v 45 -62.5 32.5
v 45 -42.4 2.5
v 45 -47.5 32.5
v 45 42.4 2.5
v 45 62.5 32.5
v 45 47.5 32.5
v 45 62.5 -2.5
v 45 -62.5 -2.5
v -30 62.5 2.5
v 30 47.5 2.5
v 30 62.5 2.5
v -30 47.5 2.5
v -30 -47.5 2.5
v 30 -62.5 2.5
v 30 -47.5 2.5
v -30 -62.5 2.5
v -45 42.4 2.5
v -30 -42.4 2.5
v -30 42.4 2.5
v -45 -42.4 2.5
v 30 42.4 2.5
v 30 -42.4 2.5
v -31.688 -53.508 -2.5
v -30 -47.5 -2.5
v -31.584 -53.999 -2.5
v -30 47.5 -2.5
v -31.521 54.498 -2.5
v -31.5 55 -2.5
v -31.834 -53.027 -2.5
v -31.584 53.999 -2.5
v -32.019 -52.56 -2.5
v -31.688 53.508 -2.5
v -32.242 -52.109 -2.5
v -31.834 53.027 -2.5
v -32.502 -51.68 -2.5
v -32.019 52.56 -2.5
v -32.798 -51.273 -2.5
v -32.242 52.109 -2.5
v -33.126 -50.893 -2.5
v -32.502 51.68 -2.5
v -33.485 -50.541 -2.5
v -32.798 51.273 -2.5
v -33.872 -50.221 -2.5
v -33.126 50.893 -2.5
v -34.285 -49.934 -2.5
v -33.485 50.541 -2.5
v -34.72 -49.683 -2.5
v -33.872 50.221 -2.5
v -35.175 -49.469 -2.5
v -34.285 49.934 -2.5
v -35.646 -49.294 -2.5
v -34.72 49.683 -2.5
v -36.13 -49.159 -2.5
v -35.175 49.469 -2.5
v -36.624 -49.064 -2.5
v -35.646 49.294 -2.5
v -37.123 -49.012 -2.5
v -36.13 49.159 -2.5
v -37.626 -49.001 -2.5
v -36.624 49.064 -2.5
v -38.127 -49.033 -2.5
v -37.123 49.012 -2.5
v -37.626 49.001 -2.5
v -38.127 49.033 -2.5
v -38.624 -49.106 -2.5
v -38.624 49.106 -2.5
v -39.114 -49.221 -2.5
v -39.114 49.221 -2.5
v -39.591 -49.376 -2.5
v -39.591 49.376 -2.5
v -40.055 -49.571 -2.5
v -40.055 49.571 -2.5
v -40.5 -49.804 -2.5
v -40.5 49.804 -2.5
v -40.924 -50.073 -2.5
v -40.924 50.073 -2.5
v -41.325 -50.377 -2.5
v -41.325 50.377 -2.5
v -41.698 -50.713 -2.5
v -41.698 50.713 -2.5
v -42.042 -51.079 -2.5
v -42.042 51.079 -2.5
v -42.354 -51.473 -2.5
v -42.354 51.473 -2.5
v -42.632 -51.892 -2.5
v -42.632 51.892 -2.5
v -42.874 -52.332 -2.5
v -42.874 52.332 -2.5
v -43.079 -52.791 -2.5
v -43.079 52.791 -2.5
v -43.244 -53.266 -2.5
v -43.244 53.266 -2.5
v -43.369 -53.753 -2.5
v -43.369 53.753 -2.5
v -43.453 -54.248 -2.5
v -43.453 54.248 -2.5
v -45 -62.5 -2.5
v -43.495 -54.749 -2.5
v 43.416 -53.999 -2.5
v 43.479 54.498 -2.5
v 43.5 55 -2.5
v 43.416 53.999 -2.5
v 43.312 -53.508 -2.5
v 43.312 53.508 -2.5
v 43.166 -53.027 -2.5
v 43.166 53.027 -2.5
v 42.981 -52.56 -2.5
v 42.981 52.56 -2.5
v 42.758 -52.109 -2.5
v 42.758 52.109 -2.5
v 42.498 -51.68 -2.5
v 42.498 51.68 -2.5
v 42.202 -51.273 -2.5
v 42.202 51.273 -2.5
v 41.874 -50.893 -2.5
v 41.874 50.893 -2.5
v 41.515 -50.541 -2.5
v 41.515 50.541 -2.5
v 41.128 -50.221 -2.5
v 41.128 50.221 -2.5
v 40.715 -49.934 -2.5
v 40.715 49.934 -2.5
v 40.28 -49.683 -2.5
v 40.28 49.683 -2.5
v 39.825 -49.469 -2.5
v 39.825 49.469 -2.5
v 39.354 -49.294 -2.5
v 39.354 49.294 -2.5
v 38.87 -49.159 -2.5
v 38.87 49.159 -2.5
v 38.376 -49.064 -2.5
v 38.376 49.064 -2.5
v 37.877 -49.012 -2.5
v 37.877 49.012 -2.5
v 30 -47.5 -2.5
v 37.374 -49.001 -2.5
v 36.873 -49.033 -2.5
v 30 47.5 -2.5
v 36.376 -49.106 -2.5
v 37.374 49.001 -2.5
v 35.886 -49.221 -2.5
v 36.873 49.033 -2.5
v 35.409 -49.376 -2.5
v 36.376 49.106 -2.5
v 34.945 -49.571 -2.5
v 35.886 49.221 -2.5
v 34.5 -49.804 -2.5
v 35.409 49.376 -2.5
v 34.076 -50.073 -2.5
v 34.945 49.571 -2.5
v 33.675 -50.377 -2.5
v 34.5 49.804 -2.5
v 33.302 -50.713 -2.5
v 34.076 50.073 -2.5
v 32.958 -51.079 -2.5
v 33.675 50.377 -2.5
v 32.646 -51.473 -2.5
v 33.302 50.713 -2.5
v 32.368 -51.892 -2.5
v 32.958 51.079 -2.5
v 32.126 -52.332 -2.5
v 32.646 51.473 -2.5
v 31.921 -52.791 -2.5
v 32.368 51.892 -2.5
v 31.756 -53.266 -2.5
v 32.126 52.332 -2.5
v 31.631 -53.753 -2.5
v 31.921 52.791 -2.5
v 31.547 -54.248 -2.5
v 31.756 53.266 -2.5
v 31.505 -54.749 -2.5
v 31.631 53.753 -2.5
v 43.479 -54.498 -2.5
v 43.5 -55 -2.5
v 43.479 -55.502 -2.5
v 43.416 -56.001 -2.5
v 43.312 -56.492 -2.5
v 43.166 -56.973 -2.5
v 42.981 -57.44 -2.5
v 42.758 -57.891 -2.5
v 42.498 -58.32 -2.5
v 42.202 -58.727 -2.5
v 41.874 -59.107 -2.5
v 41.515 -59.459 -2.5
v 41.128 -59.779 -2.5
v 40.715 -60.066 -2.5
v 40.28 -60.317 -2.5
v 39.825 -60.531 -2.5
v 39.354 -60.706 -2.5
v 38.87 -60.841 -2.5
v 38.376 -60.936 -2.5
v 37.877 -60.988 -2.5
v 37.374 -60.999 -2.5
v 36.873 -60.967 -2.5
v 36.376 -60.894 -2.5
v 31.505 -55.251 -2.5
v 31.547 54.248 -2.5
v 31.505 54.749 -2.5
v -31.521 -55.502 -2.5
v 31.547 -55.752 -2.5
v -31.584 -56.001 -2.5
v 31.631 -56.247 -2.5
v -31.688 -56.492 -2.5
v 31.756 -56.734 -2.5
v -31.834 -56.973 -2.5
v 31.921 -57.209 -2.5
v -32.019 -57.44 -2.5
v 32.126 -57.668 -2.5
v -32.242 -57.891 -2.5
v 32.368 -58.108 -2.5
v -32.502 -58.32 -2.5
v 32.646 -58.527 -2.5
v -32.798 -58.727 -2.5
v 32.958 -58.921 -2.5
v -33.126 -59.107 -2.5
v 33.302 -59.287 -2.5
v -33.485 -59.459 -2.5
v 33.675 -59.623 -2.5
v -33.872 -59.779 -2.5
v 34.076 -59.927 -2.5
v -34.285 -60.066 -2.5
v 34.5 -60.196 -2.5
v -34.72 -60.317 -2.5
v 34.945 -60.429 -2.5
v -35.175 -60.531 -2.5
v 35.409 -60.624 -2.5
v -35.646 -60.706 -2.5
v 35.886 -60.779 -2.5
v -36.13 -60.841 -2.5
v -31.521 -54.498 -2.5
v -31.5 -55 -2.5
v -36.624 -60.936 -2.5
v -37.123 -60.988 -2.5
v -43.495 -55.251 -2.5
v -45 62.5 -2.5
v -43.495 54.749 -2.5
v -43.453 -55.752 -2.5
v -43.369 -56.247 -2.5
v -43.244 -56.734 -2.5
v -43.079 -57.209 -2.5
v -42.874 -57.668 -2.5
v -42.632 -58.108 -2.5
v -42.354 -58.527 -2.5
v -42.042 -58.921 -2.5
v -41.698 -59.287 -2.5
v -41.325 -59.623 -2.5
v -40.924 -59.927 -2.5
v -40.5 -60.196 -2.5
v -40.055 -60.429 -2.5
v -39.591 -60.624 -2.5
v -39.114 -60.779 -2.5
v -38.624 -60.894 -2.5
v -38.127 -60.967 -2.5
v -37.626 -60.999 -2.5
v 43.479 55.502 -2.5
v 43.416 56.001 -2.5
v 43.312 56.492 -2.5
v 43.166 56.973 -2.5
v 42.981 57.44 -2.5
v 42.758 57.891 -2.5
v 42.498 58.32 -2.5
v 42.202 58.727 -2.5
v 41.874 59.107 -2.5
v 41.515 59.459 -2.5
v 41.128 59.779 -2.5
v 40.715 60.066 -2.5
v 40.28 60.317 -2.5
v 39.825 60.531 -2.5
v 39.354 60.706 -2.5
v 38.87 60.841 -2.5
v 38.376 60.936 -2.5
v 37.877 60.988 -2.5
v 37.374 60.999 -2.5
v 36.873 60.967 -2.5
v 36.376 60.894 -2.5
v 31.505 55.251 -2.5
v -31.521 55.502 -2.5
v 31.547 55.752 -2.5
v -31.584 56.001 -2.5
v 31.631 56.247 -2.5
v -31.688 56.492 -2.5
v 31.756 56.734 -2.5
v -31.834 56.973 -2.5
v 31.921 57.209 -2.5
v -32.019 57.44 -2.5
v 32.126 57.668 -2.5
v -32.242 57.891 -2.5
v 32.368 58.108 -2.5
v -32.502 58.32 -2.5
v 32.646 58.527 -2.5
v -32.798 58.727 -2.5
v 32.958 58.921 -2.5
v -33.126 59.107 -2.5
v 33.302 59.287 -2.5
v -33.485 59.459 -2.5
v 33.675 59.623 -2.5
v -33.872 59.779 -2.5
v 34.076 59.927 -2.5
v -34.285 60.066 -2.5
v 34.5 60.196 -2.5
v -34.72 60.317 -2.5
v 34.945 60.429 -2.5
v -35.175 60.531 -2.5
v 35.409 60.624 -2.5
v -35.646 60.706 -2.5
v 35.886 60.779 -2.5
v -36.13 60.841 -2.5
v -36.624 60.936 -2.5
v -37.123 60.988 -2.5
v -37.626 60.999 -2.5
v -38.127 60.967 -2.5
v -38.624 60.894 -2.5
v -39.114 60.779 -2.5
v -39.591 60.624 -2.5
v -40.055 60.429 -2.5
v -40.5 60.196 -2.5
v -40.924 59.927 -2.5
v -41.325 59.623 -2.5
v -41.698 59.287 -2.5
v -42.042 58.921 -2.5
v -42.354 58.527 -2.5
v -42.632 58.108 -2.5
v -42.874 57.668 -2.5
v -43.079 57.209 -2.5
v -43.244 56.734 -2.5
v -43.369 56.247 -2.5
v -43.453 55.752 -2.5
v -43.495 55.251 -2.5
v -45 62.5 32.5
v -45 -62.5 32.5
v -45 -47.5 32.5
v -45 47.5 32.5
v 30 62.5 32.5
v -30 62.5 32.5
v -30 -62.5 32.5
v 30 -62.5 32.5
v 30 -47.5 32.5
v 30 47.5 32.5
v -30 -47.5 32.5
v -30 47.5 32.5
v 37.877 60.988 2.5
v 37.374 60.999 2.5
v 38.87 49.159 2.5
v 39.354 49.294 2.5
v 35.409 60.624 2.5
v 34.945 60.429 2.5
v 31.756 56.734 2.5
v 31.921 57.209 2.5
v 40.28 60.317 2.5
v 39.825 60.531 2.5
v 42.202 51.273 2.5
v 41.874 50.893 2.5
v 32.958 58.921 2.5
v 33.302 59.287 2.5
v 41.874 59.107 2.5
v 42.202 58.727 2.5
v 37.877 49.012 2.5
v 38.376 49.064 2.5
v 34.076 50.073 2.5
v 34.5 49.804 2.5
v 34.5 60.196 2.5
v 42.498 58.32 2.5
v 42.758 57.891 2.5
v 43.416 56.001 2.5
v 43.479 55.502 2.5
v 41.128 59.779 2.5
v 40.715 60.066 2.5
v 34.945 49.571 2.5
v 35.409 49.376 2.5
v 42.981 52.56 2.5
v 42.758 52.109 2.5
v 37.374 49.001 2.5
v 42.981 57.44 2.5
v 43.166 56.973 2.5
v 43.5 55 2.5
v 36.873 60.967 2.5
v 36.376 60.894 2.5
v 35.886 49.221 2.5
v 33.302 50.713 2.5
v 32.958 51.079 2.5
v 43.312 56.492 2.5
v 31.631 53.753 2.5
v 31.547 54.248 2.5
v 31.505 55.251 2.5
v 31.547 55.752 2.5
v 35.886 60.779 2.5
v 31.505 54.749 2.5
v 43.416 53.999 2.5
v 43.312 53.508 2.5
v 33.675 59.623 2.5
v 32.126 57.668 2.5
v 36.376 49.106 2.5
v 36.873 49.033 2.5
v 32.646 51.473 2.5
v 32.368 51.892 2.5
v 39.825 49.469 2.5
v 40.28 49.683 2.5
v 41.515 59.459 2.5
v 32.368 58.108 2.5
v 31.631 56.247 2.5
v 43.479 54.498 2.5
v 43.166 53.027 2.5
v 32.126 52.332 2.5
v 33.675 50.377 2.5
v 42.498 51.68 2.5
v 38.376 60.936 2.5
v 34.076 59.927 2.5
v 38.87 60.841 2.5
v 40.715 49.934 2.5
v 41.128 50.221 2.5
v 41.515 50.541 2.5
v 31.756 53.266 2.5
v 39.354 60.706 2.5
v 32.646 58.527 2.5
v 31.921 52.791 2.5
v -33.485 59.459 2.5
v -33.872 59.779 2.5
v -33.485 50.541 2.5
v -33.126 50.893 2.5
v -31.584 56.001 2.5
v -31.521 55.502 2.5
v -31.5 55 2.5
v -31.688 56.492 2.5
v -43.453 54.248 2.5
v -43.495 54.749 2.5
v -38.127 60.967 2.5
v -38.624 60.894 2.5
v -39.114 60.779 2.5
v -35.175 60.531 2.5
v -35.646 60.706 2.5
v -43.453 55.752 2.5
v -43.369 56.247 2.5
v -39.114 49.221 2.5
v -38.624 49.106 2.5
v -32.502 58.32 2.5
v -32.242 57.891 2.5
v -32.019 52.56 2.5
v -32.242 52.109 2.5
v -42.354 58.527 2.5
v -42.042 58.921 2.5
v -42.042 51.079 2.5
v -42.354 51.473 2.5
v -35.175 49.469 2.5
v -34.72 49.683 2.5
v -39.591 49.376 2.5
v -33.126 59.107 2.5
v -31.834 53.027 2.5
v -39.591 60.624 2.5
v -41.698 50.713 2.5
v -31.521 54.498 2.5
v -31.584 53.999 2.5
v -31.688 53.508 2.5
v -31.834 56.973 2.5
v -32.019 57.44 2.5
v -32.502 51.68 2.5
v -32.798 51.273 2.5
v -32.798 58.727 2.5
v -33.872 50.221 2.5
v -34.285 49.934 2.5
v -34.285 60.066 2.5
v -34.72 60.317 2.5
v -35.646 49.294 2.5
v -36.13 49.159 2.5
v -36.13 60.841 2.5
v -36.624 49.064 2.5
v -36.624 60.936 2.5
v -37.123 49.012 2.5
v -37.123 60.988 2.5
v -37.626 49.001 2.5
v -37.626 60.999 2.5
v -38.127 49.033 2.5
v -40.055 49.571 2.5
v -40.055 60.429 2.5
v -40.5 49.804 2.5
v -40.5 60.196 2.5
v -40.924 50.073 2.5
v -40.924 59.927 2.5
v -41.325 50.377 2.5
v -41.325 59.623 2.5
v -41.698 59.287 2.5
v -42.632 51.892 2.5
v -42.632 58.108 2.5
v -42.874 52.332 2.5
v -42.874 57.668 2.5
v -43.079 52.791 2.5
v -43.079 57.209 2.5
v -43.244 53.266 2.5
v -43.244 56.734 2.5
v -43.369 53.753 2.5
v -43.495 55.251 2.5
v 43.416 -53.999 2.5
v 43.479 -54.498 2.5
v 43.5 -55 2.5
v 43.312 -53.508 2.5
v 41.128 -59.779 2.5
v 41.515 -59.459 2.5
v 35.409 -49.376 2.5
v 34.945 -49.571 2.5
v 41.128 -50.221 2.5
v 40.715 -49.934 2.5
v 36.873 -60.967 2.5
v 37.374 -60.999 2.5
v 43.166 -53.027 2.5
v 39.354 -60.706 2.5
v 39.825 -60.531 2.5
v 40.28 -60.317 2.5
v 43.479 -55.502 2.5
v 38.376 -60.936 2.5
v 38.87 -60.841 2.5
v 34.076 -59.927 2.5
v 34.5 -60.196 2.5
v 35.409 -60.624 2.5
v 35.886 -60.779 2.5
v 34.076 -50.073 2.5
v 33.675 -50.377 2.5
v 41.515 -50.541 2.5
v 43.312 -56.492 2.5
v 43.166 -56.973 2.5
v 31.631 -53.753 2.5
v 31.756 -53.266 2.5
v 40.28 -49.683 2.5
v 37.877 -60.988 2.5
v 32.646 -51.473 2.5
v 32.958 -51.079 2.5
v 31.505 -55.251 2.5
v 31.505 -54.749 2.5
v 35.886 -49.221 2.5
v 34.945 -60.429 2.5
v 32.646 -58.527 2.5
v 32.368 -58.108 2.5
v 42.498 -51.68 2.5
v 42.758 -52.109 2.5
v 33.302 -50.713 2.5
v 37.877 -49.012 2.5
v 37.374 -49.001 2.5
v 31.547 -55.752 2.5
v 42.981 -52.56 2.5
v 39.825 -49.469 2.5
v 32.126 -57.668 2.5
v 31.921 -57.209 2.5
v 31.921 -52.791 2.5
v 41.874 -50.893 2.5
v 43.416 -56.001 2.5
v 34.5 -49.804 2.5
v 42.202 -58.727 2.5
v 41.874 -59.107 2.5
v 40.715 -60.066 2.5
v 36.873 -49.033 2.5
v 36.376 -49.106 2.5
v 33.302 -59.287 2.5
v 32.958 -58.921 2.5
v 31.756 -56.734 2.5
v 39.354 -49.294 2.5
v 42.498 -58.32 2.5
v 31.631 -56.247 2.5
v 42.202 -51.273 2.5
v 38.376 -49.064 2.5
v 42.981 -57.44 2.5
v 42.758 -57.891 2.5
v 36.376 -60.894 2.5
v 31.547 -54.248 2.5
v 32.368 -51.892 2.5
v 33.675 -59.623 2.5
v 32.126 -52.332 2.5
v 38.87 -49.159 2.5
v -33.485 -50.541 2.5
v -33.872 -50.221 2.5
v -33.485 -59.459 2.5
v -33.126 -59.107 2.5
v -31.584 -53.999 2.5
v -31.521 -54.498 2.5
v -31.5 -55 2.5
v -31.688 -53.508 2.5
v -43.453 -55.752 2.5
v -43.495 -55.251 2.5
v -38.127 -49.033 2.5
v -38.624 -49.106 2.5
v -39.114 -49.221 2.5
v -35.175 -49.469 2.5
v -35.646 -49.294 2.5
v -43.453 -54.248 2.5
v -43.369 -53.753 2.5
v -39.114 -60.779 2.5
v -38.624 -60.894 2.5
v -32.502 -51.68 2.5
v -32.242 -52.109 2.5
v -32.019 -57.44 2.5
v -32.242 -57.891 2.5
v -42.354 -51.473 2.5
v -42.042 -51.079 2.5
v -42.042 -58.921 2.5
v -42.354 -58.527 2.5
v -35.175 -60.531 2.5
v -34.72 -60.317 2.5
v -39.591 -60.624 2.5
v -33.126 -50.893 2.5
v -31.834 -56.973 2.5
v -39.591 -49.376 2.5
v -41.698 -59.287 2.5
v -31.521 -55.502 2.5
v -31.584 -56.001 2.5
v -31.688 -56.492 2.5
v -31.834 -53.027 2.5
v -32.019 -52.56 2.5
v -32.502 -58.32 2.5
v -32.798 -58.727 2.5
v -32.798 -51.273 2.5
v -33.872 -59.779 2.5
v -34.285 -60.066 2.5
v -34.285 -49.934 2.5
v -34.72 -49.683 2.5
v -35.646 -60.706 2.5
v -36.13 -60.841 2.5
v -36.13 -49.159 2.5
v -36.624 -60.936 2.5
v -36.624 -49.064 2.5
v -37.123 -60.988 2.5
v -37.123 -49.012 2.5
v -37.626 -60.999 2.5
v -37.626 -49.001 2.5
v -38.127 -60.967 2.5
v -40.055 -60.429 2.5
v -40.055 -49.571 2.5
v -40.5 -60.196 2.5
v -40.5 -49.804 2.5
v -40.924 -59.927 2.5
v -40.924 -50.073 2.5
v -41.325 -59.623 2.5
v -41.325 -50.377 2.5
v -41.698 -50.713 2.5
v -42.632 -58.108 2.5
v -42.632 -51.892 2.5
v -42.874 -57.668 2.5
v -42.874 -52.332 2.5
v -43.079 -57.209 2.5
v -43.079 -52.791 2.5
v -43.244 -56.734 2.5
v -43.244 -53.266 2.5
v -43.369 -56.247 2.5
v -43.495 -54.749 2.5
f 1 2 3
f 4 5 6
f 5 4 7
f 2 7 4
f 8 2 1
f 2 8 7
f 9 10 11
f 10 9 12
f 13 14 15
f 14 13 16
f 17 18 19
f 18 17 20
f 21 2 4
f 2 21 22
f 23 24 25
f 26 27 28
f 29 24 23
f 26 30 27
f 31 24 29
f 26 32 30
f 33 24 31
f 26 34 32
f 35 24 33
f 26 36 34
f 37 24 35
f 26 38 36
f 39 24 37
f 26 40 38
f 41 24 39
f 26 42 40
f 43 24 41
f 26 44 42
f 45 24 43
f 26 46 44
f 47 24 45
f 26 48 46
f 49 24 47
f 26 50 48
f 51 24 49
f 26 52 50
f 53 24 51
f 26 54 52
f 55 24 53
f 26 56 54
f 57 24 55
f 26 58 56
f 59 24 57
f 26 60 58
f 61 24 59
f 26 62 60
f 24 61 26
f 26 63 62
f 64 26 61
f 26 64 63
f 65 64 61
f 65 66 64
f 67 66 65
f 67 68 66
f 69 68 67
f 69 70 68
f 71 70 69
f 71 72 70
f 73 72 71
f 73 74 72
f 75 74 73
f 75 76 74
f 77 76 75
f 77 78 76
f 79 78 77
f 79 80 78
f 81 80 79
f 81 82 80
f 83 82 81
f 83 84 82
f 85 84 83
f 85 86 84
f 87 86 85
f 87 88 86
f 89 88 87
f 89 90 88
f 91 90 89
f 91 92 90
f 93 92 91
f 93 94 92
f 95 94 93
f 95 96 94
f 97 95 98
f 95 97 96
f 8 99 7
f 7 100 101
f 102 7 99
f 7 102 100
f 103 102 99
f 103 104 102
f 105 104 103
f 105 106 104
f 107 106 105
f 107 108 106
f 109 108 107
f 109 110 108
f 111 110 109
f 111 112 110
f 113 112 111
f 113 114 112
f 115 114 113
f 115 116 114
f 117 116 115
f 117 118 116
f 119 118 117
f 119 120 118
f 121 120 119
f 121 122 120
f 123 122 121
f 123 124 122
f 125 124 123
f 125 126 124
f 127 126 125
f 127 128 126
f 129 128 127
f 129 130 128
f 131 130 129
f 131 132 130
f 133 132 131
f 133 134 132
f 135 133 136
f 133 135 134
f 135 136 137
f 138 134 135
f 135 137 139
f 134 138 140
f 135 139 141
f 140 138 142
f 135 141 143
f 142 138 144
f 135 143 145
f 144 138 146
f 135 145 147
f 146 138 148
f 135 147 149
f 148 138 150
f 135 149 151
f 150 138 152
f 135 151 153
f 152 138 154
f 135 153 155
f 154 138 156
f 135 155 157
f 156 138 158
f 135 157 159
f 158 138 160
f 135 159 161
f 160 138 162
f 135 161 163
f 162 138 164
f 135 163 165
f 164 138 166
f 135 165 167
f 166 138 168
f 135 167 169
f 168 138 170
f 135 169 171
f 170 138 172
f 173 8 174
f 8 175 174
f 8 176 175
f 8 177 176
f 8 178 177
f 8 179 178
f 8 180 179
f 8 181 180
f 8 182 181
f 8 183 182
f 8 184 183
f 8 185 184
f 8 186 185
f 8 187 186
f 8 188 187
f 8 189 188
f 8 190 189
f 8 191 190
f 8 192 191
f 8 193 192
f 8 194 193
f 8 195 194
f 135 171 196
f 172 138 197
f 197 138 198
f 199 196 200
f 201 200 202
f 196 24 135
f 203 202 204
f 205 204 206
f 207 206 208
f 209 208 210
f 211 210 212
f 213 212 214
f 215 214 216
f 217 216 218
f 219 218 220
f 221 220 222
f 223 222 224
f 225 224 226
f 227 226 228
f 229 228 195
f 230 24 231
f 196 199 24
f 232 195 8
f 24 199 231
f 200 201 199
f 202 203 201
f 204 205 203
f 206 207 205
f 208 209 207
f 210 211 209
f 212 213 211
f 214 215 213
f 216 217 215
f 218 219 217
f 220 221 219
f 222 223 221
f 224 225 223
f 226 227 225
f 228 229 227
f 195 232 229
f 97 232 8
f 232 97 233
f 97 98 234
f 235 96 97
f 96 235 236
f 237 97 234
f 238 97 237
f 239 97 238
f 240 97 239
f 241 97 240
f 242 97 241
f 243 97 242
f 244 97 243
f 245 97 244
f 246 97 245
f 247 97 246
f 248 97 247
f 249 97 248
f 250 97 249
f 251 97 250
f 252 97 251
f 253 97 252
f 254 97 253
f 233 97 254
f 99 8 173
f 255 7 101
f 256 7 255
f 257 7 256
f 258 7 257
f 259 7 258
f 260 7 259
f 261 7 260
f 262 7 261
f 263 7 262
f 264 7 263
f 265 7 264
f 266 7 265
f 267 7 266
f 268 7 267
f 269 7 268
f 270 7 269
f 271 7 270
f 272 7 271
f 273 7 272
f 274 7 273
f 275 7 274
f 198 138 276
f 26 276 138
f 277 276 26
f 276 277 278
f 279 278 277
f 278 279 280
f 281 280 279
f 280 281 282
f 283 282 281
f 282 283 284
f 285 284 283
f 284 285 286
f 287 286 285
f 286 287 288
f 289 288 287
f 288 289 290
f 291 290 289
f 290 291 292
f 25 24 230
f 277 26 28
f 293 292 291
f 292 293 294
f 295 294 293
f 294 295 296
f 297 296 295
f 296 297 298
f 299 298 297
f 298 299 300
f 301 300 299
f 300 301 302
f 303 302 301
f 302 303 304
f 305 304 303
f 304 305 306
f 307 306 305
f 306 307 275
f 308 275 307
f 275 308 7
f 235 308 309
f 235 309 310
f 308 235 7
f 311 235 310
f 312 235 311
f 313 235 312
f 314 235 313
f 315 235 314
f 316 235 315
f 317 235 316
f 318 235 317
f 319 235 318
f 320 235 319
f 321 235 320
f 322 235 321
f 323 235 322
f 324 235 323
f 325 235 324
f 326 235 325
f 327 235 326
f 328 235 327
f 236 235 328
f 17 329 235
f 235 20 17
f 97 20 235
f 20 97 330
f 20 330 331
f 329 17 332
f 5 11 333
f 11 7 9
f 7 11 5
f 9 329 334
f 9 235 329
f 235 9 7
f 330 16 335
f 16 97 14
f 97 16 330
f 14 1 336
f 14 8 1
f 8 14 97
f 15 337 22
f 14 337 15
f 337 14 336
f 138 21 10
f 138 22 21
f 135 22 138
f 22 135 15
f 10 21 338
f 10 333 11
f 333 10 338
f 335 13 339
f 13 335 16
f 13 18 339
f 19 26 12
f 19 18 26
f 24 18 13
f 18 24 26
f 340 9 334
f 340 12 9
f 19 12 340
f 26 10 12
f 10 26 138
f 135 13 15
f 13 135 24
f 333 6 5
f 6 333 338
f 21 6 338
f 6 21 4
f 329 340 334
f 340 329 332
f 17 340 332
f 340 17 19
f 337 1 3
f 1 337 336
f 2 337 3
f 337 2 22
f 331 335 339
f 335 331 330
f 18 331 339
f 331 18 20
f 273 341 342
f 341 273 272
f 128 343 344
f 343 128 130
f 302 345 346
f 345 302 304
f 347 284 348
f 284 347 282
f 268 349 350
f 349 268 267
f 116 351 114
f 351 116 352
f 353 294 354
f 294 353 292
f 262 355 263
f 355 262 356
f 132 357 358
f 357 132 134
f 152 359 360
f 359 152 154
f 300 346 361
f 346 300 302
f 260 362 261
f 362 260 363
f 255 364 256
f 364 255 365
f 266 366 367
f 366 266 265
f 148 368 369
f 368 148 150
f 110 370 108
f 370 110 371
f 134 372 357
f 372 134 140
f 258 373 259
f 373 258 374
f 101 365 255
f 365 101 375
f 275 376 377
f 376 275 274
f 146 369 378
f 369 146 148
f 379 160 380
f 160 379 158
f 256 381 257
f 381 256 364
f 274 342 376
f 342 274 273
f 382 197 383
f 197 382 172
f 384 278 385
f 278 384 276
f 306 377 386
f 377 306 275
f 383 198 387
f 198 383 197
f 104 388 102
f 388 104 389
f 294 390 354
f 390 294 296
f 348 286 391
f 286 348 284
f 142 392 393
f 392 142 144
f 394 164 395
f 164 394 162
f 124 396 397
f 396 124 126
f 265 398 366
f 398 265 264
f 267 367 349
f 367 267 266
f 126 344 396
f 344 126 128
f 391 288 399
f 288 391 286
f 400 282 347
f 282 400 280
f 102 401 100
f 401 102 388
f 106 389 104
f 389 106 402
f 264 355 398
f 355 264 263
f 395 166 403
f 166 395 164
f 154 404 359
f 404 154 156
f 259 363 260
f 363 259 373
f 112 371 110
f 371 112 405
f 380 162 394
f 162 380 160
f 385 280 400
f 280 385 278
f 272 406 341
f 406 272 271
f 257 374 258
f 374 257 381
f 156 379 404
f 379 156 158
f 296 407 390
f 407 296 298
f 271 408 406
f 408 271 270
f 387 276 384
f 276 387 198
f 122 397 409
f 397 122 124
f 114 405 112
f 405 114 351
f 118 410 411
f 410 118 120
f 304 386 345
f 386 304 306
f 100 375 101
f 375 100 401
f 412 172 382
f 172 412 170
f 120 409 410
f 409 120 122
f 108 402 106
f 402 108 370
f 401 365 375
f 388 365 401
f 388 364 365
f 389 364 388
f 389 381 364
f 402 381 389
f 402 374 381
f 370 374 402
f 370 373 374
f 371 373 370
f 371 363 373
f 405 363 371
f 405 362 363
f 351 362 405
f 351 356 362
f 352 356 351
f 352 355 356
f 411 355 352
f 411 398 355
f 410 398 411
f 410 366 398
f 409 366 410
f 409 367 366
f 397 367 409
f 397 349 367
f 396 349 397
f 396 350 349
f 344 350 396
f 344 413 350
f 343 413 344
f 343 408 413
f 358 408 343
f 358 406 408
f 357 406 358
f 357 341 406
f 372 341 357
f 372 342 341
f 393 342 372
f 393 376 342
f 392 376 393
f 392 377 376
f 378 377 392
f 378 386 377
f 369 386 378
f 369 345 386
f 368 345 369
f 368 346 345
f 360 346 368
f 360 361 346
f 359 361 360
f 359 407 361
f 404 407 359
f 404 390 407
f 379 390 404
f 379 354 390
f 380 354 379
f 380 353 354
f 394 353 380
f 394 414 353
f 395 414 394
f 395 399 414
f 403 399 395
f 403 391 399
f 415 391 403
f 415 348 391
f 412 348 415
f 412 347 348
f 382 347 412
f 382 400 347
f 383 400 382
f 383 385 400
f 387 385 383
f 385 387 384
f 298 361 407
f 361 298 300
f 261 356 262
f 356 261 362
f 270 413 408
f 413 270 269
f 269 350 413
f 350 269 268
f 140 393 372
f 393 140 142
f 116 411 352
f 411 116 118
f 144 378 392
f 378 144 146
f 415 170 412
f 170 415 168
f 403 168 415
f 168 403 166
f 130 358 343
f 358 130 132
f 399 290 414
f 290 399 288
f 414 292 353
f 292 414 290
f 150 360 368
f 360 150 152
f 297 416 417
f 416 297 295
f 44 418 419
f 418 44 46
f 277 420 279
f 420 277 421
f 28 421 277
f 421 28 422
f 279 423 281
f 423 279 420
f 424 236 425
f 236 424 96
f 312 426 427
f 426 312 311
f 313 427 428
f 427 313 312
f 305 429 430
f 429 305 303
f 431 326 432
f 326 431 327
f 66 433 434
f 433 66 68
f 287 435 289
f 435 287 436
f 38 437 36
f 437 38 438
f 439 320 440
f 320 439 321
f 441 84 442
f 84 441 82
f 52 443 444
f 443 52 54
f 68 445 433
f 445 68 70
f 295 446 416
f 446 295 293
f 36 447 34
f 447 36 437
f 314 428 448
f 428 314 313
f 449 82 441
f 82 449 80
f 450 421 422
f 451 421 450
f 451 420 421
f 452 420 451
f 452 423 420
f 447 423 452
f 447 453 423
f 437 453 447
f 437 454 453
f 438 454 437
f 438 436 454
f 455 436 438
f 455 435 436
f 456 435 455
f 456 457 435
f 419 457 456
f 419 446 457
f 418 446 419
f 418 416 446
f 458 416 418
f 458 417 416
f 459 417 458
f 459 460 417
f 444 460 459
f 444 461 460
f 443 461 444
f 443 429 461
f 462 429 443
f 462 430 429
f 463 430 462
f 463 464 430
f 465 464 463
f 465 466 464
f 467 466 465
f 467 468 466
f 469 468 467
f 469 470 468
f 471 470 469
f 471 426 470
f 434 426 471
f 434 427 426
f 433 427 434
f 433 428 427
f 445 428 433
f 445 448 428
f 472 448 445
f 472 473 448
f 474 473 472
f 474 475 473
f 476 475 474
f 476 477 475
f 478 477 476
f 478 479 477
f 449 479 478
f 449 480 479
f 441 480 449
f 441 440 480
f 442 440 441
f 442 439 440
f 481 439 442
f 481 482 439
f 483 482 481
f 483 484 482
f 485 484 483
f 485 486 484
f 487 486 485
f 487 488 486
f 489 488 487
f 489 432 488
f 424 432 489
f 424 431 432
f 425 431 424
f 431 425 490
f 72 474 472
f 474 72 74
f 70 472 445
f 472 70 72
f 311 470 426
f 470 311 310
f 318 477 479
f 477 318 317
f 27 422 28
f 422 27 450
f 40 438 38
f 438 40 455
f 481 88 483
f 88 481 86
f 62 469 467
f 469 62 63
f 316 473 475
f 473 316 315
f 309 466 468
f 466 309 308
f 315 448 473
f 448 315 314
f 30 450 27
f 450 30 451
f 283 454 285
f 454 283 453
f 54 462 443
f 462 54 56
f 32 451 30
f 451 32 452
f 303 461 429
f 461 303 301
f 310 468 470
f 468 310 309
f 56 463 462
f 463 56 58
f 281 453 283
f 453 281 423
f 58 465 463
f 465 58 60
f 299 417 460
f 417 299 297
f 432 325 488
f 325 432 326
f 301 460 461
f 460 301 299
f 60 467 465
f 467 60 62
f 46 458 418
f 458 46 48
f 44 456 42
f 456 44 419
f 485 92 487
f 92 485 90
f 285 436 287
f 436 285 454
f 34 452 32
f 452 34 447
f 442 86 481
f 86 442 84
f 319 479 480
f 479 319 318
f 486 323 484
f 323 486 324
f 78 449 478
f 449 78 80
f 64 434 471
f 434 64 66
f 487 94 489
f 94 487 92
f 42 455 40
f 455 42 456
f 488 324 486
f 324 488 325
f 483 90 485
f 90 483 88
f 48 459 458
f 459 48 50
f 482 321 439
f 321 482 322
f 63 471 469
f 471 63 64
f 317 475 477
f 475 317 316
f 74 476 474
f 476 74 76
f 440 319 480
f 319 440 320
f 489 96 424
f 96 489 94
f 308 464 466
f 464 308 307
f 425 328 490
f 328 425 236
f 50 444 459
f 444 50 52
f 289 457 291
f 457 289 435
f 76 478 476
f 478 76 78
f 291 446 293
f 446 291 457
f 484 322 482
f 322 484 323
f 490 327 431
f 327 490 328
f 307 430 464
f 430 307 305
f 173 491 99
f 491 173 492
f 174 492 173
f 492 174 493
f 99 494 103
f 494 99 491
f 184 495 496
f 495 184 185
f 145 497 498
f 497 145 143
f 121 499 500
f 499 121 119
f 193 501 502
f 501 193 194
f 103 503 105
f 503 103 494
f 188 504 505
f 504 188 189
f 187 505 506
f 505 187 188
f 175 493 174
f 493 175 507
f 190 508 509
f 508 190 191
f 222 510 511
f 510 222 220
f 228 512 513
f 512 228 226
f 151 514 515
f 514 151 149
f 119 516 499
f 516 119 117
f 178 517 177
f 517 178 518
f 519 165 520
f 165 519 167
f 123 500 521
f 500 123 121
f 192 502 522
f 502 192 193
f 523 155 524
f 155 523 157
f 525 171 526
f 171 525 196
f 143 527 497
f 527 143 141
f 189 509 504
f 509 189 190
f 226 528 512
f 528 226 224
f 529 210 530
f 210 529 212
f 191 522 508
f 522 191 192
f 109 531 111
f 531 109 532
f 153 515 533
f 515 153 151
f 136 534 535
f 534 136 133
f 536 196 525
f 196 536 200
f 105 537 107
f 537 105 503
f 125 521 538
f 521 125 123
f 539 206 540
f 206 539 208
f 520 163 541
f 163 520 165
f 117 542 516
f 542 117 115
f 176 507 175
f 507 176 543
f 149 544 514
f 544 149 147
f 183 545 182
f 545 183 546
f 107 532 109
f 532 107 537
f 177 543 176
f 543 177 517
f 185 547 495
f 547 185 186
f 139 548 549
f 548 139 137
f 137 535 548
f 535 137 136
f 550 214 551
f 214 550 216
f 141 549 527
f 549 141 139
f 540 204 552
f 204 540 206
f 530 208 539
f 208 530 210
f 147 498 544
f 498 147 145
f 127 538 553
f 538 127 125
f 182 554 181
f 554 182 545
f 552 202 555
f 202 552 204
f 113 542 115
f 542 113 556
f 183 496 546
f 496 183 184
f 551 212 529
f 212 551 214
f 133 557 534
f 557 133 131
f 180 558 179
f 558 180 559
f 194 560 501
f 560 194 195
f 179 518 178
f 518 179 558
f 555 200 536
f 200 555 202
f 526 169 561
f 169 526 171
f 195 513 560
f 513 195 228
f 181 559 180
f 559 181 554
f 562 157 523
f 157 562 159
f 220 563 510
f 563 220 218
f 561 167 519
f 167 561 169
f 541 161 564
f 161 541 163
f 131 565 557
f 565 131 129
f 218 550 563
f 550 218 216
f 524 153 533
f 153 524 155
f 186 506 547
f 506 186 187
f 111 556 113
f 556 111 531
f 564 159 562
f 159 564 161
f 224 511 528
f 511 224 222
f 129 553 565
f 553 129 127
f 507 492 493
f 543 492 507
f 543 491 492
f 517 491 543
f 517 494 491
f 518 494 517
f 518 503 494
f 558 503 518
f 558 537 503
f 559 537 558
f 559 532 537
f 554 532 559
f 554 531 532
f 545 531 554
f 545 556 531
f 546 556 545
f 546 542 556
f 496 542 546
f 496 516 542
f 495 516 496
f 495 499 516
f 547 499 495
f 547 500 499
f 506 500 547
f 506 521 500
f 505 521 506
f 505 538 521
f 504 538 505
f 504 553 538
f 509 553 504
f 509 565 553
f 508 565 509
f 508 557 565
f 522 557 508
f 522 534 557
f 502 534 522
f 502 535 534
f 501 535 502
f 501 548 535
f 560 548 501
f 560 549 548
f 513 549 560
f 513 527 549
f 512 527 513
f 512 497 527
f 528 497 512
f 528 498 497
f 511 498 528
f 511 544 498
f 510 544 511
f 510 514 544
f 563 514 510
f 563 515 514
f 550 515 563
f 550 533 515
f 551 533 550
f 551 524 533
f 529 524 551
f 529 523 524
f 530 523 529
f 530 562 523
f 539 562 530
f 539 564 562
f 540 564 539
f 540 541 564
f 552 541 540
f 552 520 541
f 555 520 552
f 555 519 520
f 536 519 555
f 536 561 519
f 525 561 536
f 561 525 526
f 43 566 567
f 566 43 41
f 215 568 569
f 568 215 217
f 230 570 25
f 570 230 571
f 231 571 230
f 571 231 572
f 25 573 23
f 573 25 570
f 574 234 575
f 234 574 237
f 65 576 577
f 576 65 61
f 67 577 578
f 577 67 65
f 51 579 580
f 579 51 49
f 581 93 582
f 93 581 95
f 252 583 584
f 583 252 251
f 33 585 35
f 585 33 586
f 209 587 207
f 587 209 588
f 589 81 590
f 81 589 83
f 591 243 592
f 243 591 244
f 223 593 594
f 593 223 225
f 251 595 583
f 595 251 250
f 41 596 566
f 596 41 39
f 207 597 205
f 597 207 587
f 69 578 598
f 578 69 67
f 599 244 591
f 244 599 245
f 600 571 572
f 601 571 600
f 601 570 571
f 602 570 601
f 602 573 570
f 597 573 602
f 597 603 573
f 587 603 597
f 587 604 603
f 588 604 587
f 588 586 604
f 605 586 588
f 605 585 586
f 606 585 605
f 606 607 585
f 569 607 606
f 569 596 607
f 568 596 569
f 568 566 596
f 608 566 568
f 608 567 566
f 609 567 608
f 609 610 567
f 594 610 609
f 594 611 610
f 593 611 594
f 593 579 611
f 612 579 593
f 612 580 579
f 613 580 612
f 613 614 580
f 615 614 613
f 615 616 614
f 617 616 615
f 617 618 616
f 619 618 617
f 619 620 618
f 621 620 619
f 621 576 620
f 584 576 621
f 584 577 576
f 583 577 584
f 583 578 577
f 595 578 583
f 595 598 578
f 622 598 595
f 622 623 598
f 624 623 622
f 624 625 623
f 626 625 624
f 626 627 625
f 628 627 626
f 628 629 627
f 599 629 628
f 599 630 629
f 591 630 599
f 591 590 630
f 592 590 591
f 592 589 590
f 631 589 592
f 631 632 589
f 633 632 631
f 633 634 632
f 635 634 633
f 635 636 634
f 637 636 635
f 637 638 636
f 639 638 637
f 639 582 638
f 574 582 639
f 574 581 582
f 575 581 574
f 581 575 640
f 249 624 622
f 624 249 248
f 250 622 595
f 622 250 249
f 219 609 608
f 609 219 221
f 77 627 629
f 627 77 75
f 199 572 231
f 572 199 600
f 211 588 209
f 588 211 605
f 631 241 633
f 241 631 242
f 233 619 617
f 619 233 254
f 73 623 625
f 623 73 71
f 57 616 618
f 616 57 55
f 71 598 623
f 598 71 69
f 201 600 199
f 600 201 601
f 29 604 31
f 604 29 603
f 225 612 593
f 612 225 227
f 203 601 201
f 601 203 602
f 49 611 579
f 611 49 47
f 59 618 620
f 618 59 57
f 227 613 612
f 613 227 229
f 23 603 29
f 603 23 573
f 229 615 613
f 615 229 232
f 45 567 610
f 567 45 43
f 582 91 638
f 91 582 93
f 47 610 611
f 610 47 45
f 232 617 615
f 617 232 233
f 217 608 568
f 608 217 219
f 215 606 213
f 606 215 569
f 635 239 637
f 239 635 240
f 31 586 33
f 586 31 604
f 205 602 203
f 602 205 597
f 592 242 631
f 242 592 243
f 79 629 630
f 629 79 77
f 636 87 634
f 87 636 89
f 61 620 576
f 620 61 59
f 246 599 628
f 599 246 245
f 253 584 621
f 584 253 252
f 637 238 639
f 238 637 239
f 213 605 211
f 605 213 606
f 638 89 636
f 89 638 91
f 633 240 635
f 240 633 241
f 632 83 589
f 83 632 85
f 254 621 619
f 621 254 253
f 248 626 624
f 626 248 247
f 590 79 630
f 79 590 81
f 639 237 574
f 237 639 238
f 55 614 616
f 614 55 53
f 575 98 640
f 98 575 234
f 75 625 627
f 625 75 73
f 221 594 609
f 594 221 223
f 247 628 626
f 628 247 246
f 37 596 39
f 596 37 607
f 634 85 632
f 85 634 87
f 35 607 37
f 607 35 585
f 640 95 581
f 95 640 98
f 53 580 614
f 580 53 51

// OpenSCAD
/*
 * Stand for my amplifier (Fosi Audio V3) to make it rest
 * comfortably on my desk lifted over my monitor stand.
 */

// PARAMETERS

frame_x = 90; // mm
frame_y = 125; // mm
frame_z = 5; // mm
frame_thickness = 15; // mm

indent_offset = 1.5; // mm
indent_diameter = 12; // mm
indent_height = 5; // mm

feet_height = 30; // mm
slide_scale = 1.34; // percentage

// MODEL

y_off = (frame_y - frame_thickness) * 0.5;
x_off = (frame_x - frame_thickness) * 0.5;

difference() {

union() {
    // frame
    difference() {
        cube([frame_x, frame_y, frame_z], true);
        cube([frame_x - (2 * frame_thickness), frame_y - (2 * frame_thickness), frame_z], true);
    }
    
    // feet
    slide_off = (frame_thickness * (slide_scale - 1)) * 0.5;
    hull() {
        translate([x_off, y_off - slide_off, frame_z * 0.5]) {
            cube([frame_thickness, frame_thickness * slide_scale, 0.0001], true);
        }
        translate([x_off, y_off, (feet_height + frame_z) * 0.5]) {
            cube([frame_thickness, frame_thickness, feet_height], true);
        }
    }
    hull() {
        translate([-x_off, y_off - slide_off, frame_z * 0.5]) {
            cube([frame_thickness, frame_thickness * slide_scale, 0.0001], true);
        }
        translate([-x_off, y_off, (feet_height + frame_z) * 0.5]) {
            cube([frame_thickness, frame_thickness, feet_height], true);
        }
    }
    hull() {
        translate([x_off, - (y_off - slide_off), frame_z * 0.5]) {
            cube([frame_thickness, frame_thickness * slide_scale, 0.0001], true);
        }
        translate([x_off, -y_off, (feet_height + frame_z) * 0.5]) {
            cube([frame_thickness, frame_thickness, feet_height], true);
        }
    }
    hull() {
        translate([-x_off, - (y_off - slide_off), frame_z * 0.5]) {
            cube([frame_thickness, frame_thickness * slide_scale, 0.0001], true);
        }
        translate([-x_off, -y_off, (feet_height + frame_z) * 0.5]) {
            cube([frame_thickness, frame_thickness, feet_height], true);
        }
    }
}


// indent
$fn = 75;
union() {
    translate([x_off, y_off, 0]) {
        cylinder(h = indent_height, d = indent_diameter, center = true);
    }
    translate([-x_off, y_off, 0]) {
        cylinder(h = indent_height, d = indent_diameter, center = true);
    }
    translate([x_off, -y_off, 0]) {
        cylinder(h = indent_height, d = indent_diameter, center = true);
    }
    translate([-x_off, -y_off, 0]) {
        cylinder(h = indent_height, d = indent_diameter, center = true);
    }
}

}
